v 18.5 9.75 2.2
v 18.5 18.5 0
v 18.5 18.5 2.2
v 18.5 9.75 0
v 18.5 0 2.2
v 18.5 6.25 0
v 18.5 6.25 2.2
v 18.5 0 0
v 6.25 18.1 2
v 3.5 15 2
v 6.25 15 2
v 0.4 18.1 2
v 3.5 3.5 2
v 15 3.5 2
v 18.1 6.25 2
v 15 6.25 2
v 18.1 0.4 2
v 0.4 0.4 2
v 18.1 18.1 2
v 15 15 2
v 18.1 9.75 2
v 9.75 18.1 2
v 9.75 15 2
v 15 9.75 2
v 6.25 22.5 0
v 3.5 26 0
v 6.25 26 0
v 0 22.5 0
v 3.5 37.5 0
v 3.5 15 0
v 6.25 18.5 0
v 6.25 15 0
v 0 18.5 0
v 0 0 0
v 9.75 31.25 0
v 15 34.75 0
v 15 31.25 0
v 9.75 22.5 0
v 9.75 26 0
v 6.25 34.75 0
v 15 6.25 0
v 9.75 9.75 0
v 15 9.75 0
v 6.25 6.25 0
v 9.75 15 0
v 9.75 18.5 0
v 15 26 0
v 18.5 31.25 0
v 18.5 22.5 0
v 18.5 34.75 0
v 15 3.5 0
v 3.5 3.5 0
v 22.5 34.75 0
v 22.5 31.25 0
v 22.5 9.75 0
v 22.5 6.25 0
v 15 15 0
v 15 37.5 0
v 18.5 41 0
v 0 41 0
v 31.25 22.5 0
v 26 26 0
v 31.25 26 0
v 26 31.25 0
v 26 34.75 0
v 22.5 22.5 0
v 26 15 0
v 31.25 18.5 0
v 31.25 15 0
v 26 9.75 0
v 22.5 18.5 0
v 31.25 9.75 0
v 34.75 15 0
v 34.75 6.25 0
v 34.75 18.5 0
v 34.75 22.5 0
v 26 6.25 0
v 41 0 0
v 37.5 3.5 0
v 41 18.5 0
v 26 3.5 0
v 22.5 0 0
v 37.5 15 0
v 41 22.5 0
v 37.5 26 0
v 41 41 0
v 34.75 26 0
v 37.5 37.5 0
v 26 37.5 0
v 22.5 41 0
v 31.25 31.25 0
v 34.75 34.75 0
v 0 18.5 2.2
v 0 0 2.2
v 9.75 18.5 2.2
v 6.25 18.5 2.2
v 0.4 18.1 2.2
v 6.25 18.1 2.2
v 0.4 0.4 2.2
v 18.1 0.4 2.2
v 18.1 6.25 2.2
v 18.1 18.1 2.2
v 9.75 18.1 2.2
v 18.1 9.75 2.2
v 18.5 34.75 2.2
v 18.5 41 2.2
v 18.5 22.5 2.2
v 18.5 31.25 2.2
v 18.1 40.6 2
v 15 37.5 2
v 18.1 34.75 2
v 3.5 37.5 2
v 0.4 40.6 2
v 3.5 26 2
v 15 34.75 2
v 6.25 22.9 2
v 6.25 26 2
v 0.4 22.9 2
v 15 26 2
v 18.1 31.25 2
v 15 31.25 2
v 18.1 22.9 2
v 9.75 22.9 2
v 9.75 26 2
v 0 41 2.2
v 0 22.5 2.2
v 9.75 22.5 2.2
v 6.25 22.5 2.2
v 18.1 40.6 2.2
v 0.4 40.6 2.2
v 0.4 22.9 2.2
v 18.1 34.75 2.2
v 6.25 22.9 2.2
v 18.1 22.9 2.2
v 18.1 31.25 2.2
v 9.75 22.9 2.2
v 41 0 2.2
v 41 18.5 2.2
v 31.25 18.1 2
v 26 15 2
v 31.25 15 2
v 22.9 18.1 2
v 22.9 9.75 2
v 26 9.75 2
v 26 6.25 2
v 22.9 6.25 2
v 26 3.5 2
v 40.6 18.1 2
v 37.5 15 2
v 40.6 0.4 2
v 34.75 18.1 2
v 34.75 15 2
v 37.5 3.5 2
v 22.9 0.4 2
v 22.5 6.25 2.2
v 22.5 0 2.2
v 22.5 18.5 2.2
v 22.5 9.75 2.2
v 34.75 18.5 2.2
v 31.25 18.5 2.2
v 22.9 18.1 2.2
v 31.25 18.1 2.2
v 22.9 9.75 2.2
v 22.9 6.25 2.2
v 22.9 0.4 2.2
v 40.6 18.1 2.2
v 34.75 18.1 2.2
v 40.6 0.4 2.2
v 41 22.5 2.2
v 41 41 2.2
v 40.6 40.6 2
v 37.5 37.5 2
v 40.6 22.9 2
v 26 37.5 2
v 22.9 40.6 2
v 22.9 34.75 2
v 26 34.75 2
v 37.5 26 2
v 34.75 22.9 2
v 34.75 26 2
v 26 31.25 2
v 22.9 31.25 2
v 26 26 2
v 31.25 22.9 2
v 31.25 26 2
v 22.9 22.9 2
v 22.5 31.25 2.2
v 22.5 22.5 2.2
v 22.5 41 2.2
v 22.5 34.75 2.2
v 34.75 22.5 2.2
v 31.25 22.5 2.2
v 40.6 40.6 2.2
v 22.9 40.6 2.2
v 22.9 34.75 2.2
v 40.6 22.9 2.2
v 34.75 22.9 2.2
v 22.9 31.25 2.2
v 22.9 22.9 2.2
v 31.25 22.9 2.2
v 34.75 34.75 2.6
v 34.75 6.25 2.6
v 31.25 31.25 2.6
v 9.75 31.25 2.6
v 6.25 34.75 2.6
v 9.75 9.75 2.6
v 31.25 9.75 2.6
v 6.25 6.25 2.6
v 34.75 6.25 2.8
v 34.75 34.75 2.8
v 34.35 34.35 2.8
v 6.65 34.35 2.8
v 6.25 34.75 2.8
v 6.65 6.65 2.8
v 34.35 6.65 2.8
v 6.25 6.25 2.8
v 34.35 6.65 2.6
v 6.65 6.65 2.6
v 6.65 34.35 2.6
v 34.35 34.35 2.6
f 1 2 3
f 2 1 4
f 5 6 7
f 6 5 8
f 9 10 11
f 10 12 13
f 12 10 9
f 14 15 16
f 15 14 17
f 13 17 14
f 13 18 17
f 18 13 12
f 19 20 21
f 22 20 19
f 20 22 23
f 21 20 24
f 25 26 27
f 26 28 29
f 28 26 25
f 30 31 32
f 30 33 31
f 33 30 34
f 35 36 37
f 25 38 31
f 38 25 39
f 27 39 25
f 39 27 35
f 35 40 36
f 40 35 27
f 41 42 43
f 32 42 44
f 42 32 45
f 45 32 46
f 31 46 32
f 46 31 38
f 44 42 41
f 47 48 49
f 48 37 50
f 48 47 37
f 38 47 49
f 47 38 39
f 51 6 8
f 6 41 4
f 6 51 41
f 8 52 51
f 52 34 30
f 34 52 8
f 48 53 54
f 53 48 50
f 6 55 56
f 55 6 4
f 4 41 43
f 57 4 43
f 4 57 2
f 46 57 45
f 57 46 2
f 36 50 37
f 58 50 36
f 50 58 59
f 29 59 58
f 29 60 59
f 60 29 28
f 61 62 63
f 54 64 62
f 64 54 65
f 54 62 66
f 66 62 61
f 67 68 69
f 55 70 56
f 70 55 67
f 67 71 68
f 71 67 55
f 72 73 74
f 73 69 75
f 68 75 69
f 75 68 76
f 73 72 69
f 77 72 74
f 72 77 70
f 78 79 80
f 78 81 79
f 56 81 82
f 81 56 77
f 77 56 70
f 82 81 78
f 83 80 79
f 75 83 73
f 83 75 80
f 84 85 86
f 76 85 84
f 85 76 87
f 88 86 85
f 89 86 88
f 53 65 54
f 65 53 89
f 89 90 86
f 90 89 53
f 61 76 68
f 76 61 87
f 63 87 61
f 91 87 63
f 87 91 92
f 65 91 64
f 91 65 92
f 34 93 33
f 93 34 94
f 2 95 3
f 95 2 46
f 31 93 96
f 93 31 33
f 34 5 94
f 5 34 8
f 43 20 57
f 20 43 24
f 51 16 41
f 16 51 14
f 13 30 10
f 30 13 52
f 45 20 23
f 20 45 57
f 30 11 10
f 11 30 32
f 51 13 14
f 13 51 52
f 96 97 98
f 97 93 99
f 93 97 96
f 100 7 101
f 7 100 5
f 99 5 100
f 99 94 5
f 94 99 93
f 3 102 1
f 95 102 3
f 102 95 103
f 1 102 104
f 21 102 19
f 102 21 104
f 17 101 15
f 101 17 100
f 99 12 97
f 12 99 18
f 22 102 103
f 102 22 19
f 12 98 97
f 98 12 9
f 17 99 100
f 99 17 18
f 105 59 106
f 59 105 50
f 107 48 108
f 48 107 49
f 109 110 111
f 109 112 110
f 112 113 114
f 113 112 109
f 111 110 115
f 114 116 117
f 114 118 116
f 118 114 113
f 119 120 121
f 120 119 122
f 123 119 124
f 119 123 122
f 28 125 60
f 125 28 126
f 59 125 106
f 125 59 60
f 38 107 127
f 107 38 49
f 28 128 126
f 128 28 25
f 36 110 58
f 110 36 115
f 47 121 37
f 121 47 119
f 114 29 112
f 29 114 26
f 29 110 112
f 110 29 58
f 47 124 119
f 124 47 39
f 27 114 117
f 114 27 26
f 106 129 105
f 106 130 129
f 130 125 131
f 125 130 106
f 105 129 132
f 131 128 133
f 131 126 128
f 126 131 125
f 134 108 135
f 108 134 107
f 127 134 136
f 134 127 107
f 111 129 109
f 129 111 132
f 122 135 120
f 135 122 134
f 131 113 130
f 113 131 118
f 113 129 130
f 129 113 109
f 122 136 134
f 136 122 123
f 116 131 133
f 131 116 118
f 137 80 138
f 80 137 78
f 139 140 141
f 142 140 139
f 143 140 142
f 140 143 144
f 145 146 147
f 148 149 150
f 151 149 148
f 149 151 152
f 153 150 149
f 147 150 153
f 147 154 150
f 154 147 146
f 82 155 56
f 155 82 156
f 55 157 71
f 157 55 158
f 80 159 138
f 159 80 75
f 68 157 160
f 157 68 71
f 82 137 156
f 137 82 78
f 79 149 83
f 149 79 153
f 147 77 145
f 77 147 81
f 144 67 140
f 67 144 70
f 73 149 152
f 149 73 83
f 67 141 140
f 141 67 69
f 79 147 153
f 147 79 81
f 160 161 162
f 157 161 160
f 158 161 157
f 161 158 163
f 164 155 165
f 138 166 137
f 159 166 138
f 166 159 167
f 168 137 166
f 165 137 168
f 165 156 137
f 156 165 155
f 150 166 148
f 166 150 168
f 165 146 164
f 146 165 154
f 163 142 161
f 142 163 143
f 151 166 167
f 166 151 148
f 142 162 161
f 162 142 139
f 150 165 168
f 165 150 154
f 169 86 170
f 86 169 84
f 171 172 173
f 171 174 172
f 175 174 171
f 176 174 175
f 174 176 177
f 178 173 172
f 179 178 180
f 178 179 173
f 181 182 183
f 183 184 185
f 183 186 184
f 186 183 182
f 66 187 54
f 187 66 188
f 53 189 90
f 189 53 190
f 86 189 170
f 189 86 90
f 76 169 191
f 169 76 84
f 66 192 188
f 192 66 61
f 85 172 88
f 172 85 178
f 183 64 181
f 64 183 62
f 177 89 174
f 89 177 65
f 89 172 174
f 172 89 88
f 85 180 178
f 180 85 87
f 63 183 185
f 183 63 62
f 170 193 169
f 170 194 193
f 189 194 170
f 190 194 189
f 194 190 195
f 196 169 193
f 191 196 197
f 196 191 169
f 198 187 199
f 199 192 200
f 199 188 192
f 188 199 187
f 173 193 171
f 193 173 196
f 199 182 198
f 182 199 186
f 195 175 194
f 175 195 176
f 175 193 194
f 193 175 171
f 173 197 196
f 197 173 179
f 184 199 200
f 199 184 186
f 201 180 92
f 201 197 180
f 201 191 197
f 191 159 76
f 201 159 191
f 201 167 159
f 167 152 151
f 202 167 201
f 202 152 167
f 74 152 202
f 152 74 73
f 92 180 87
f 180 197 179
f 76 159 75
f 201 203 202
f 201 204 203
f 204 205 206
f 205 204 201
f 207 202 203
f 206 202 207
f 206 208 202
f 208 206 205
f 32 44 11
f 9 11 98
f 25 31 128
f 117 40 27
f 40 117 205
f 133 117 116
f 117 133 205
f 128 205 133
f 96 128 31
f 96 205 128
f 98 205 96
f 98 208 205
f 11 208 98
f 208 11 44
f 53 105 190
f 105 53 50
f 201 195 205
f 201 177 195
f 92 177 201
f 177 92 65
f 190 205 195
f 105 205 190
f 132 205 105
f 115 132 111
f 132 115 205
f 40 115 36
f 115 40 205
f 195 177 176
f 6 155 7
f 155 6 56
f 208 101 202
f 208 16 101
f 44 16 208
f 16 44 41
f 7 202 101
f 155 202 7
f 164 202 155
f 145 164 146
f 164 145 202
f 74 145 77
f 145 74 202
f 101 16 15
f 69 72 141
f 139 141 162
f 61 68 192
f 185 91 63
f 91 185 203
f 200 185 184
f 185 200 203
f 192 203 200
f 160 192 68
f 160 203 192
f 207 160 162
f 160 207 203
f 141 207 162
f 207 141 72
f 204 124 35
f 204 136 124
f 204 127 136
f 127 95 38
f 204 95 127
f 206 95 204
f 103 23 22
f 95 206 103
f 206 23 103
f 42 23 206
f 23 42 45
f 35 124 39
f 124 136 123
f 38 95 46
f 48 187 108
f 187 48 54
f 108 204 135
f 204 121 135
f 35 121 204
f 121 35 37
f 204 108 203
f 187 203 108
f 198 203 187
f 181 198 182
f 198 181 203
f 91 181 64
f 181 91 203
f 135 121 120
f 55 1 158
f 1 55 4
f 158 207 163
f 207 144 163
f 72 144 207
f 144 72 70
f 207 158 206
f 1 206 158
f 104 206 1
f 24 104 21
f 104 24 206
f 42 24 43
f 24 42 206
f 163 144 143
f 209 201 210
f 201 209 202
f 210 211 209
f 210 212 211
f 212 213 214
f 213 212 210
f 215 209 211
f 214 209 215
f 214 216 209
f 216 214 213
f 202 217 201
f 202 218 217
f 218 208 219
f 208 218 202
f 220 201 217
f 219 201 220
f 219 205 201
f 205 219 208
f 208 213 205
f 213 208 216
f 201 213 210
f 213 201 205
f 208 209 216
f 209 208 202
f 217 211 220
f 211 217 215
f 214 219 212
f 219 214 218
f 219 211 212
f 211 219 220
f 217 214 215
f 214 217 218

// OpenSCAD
// Quad from Dentist's office

// Edge width
_EdgeWidth = 3.5;

// Small Square Width/Depth
_SmallSquareWD = 18.5;

// Small Square Height
_SmallSquareH = 2;

// Big Square Width/Depth
_BigSquareWD = 28.5;

// Big Square Height
_BigSquareH = 2.6;

// SmallSquare Space
_SmallSquareSpace = 22.5;

// Rim Width
_RimWidth = 0.4;

// Render hollow square of width and depth WD, height H, edges of EdgeWidth
module HollowSquare(WD, H, EdgeWidth)
{
	difference()
	{
		// Matter
		{
			cube([WD, WD, H], center=false);
		}
		
		// Anti-matter
		{
			translate([EdgeWidth, EdgeWidth, 0])
			{
				cube([WD - (2 * EdgeWidth), WD - (2 * EdgeWidth), H + .01], center=false);
			}
		}
	}
}

module HollowSquareWithRim(WD, H, EdgeWidth, RimWidth)
{
	HollowSquare(WD, H, EdgeWidth);
	
	translate([0, 0, H])
	{
		HollowSquare(WD, 0.2, RimWidth);
	}
}

module FourHollowSquares(WD, H, Space, EdgeWidth, RimWidth)
{
	for (x = [0 : 1])
	{
		for (y = [0 : 1])
		{
			translate([x * Space, y * Space, 0])
			{
				HollowSquareWithRim(WD,  H, EdgeWidth, RimWidth);
			}
		}
	}
}

module FiveSquare(SmallWD, BigWD, SmallH, BigH, Space, EdgeWidth, RimWidth)
{
	Center = (Space + SmallWD) / 2;

	union()
	{
		FourHollowSquares(SmallWD, SmallH, Space, EdgeWidth, RimWidth);
		
		translate([Center - BigWD / 2, Center - BigWD / 2, 0])
		{
			HollowSquareWithRim(BigWD, BigH, EdgeWidth, RimWidth);
		}
	}	
}

module main()
{
	FiveSquare(_SmallSquareWD, _BigSquareWD, _SmallSquareH, _BigSquareH, _SmallSquareSpace, _EdgeWidth, _RimWidth);
}

main();
